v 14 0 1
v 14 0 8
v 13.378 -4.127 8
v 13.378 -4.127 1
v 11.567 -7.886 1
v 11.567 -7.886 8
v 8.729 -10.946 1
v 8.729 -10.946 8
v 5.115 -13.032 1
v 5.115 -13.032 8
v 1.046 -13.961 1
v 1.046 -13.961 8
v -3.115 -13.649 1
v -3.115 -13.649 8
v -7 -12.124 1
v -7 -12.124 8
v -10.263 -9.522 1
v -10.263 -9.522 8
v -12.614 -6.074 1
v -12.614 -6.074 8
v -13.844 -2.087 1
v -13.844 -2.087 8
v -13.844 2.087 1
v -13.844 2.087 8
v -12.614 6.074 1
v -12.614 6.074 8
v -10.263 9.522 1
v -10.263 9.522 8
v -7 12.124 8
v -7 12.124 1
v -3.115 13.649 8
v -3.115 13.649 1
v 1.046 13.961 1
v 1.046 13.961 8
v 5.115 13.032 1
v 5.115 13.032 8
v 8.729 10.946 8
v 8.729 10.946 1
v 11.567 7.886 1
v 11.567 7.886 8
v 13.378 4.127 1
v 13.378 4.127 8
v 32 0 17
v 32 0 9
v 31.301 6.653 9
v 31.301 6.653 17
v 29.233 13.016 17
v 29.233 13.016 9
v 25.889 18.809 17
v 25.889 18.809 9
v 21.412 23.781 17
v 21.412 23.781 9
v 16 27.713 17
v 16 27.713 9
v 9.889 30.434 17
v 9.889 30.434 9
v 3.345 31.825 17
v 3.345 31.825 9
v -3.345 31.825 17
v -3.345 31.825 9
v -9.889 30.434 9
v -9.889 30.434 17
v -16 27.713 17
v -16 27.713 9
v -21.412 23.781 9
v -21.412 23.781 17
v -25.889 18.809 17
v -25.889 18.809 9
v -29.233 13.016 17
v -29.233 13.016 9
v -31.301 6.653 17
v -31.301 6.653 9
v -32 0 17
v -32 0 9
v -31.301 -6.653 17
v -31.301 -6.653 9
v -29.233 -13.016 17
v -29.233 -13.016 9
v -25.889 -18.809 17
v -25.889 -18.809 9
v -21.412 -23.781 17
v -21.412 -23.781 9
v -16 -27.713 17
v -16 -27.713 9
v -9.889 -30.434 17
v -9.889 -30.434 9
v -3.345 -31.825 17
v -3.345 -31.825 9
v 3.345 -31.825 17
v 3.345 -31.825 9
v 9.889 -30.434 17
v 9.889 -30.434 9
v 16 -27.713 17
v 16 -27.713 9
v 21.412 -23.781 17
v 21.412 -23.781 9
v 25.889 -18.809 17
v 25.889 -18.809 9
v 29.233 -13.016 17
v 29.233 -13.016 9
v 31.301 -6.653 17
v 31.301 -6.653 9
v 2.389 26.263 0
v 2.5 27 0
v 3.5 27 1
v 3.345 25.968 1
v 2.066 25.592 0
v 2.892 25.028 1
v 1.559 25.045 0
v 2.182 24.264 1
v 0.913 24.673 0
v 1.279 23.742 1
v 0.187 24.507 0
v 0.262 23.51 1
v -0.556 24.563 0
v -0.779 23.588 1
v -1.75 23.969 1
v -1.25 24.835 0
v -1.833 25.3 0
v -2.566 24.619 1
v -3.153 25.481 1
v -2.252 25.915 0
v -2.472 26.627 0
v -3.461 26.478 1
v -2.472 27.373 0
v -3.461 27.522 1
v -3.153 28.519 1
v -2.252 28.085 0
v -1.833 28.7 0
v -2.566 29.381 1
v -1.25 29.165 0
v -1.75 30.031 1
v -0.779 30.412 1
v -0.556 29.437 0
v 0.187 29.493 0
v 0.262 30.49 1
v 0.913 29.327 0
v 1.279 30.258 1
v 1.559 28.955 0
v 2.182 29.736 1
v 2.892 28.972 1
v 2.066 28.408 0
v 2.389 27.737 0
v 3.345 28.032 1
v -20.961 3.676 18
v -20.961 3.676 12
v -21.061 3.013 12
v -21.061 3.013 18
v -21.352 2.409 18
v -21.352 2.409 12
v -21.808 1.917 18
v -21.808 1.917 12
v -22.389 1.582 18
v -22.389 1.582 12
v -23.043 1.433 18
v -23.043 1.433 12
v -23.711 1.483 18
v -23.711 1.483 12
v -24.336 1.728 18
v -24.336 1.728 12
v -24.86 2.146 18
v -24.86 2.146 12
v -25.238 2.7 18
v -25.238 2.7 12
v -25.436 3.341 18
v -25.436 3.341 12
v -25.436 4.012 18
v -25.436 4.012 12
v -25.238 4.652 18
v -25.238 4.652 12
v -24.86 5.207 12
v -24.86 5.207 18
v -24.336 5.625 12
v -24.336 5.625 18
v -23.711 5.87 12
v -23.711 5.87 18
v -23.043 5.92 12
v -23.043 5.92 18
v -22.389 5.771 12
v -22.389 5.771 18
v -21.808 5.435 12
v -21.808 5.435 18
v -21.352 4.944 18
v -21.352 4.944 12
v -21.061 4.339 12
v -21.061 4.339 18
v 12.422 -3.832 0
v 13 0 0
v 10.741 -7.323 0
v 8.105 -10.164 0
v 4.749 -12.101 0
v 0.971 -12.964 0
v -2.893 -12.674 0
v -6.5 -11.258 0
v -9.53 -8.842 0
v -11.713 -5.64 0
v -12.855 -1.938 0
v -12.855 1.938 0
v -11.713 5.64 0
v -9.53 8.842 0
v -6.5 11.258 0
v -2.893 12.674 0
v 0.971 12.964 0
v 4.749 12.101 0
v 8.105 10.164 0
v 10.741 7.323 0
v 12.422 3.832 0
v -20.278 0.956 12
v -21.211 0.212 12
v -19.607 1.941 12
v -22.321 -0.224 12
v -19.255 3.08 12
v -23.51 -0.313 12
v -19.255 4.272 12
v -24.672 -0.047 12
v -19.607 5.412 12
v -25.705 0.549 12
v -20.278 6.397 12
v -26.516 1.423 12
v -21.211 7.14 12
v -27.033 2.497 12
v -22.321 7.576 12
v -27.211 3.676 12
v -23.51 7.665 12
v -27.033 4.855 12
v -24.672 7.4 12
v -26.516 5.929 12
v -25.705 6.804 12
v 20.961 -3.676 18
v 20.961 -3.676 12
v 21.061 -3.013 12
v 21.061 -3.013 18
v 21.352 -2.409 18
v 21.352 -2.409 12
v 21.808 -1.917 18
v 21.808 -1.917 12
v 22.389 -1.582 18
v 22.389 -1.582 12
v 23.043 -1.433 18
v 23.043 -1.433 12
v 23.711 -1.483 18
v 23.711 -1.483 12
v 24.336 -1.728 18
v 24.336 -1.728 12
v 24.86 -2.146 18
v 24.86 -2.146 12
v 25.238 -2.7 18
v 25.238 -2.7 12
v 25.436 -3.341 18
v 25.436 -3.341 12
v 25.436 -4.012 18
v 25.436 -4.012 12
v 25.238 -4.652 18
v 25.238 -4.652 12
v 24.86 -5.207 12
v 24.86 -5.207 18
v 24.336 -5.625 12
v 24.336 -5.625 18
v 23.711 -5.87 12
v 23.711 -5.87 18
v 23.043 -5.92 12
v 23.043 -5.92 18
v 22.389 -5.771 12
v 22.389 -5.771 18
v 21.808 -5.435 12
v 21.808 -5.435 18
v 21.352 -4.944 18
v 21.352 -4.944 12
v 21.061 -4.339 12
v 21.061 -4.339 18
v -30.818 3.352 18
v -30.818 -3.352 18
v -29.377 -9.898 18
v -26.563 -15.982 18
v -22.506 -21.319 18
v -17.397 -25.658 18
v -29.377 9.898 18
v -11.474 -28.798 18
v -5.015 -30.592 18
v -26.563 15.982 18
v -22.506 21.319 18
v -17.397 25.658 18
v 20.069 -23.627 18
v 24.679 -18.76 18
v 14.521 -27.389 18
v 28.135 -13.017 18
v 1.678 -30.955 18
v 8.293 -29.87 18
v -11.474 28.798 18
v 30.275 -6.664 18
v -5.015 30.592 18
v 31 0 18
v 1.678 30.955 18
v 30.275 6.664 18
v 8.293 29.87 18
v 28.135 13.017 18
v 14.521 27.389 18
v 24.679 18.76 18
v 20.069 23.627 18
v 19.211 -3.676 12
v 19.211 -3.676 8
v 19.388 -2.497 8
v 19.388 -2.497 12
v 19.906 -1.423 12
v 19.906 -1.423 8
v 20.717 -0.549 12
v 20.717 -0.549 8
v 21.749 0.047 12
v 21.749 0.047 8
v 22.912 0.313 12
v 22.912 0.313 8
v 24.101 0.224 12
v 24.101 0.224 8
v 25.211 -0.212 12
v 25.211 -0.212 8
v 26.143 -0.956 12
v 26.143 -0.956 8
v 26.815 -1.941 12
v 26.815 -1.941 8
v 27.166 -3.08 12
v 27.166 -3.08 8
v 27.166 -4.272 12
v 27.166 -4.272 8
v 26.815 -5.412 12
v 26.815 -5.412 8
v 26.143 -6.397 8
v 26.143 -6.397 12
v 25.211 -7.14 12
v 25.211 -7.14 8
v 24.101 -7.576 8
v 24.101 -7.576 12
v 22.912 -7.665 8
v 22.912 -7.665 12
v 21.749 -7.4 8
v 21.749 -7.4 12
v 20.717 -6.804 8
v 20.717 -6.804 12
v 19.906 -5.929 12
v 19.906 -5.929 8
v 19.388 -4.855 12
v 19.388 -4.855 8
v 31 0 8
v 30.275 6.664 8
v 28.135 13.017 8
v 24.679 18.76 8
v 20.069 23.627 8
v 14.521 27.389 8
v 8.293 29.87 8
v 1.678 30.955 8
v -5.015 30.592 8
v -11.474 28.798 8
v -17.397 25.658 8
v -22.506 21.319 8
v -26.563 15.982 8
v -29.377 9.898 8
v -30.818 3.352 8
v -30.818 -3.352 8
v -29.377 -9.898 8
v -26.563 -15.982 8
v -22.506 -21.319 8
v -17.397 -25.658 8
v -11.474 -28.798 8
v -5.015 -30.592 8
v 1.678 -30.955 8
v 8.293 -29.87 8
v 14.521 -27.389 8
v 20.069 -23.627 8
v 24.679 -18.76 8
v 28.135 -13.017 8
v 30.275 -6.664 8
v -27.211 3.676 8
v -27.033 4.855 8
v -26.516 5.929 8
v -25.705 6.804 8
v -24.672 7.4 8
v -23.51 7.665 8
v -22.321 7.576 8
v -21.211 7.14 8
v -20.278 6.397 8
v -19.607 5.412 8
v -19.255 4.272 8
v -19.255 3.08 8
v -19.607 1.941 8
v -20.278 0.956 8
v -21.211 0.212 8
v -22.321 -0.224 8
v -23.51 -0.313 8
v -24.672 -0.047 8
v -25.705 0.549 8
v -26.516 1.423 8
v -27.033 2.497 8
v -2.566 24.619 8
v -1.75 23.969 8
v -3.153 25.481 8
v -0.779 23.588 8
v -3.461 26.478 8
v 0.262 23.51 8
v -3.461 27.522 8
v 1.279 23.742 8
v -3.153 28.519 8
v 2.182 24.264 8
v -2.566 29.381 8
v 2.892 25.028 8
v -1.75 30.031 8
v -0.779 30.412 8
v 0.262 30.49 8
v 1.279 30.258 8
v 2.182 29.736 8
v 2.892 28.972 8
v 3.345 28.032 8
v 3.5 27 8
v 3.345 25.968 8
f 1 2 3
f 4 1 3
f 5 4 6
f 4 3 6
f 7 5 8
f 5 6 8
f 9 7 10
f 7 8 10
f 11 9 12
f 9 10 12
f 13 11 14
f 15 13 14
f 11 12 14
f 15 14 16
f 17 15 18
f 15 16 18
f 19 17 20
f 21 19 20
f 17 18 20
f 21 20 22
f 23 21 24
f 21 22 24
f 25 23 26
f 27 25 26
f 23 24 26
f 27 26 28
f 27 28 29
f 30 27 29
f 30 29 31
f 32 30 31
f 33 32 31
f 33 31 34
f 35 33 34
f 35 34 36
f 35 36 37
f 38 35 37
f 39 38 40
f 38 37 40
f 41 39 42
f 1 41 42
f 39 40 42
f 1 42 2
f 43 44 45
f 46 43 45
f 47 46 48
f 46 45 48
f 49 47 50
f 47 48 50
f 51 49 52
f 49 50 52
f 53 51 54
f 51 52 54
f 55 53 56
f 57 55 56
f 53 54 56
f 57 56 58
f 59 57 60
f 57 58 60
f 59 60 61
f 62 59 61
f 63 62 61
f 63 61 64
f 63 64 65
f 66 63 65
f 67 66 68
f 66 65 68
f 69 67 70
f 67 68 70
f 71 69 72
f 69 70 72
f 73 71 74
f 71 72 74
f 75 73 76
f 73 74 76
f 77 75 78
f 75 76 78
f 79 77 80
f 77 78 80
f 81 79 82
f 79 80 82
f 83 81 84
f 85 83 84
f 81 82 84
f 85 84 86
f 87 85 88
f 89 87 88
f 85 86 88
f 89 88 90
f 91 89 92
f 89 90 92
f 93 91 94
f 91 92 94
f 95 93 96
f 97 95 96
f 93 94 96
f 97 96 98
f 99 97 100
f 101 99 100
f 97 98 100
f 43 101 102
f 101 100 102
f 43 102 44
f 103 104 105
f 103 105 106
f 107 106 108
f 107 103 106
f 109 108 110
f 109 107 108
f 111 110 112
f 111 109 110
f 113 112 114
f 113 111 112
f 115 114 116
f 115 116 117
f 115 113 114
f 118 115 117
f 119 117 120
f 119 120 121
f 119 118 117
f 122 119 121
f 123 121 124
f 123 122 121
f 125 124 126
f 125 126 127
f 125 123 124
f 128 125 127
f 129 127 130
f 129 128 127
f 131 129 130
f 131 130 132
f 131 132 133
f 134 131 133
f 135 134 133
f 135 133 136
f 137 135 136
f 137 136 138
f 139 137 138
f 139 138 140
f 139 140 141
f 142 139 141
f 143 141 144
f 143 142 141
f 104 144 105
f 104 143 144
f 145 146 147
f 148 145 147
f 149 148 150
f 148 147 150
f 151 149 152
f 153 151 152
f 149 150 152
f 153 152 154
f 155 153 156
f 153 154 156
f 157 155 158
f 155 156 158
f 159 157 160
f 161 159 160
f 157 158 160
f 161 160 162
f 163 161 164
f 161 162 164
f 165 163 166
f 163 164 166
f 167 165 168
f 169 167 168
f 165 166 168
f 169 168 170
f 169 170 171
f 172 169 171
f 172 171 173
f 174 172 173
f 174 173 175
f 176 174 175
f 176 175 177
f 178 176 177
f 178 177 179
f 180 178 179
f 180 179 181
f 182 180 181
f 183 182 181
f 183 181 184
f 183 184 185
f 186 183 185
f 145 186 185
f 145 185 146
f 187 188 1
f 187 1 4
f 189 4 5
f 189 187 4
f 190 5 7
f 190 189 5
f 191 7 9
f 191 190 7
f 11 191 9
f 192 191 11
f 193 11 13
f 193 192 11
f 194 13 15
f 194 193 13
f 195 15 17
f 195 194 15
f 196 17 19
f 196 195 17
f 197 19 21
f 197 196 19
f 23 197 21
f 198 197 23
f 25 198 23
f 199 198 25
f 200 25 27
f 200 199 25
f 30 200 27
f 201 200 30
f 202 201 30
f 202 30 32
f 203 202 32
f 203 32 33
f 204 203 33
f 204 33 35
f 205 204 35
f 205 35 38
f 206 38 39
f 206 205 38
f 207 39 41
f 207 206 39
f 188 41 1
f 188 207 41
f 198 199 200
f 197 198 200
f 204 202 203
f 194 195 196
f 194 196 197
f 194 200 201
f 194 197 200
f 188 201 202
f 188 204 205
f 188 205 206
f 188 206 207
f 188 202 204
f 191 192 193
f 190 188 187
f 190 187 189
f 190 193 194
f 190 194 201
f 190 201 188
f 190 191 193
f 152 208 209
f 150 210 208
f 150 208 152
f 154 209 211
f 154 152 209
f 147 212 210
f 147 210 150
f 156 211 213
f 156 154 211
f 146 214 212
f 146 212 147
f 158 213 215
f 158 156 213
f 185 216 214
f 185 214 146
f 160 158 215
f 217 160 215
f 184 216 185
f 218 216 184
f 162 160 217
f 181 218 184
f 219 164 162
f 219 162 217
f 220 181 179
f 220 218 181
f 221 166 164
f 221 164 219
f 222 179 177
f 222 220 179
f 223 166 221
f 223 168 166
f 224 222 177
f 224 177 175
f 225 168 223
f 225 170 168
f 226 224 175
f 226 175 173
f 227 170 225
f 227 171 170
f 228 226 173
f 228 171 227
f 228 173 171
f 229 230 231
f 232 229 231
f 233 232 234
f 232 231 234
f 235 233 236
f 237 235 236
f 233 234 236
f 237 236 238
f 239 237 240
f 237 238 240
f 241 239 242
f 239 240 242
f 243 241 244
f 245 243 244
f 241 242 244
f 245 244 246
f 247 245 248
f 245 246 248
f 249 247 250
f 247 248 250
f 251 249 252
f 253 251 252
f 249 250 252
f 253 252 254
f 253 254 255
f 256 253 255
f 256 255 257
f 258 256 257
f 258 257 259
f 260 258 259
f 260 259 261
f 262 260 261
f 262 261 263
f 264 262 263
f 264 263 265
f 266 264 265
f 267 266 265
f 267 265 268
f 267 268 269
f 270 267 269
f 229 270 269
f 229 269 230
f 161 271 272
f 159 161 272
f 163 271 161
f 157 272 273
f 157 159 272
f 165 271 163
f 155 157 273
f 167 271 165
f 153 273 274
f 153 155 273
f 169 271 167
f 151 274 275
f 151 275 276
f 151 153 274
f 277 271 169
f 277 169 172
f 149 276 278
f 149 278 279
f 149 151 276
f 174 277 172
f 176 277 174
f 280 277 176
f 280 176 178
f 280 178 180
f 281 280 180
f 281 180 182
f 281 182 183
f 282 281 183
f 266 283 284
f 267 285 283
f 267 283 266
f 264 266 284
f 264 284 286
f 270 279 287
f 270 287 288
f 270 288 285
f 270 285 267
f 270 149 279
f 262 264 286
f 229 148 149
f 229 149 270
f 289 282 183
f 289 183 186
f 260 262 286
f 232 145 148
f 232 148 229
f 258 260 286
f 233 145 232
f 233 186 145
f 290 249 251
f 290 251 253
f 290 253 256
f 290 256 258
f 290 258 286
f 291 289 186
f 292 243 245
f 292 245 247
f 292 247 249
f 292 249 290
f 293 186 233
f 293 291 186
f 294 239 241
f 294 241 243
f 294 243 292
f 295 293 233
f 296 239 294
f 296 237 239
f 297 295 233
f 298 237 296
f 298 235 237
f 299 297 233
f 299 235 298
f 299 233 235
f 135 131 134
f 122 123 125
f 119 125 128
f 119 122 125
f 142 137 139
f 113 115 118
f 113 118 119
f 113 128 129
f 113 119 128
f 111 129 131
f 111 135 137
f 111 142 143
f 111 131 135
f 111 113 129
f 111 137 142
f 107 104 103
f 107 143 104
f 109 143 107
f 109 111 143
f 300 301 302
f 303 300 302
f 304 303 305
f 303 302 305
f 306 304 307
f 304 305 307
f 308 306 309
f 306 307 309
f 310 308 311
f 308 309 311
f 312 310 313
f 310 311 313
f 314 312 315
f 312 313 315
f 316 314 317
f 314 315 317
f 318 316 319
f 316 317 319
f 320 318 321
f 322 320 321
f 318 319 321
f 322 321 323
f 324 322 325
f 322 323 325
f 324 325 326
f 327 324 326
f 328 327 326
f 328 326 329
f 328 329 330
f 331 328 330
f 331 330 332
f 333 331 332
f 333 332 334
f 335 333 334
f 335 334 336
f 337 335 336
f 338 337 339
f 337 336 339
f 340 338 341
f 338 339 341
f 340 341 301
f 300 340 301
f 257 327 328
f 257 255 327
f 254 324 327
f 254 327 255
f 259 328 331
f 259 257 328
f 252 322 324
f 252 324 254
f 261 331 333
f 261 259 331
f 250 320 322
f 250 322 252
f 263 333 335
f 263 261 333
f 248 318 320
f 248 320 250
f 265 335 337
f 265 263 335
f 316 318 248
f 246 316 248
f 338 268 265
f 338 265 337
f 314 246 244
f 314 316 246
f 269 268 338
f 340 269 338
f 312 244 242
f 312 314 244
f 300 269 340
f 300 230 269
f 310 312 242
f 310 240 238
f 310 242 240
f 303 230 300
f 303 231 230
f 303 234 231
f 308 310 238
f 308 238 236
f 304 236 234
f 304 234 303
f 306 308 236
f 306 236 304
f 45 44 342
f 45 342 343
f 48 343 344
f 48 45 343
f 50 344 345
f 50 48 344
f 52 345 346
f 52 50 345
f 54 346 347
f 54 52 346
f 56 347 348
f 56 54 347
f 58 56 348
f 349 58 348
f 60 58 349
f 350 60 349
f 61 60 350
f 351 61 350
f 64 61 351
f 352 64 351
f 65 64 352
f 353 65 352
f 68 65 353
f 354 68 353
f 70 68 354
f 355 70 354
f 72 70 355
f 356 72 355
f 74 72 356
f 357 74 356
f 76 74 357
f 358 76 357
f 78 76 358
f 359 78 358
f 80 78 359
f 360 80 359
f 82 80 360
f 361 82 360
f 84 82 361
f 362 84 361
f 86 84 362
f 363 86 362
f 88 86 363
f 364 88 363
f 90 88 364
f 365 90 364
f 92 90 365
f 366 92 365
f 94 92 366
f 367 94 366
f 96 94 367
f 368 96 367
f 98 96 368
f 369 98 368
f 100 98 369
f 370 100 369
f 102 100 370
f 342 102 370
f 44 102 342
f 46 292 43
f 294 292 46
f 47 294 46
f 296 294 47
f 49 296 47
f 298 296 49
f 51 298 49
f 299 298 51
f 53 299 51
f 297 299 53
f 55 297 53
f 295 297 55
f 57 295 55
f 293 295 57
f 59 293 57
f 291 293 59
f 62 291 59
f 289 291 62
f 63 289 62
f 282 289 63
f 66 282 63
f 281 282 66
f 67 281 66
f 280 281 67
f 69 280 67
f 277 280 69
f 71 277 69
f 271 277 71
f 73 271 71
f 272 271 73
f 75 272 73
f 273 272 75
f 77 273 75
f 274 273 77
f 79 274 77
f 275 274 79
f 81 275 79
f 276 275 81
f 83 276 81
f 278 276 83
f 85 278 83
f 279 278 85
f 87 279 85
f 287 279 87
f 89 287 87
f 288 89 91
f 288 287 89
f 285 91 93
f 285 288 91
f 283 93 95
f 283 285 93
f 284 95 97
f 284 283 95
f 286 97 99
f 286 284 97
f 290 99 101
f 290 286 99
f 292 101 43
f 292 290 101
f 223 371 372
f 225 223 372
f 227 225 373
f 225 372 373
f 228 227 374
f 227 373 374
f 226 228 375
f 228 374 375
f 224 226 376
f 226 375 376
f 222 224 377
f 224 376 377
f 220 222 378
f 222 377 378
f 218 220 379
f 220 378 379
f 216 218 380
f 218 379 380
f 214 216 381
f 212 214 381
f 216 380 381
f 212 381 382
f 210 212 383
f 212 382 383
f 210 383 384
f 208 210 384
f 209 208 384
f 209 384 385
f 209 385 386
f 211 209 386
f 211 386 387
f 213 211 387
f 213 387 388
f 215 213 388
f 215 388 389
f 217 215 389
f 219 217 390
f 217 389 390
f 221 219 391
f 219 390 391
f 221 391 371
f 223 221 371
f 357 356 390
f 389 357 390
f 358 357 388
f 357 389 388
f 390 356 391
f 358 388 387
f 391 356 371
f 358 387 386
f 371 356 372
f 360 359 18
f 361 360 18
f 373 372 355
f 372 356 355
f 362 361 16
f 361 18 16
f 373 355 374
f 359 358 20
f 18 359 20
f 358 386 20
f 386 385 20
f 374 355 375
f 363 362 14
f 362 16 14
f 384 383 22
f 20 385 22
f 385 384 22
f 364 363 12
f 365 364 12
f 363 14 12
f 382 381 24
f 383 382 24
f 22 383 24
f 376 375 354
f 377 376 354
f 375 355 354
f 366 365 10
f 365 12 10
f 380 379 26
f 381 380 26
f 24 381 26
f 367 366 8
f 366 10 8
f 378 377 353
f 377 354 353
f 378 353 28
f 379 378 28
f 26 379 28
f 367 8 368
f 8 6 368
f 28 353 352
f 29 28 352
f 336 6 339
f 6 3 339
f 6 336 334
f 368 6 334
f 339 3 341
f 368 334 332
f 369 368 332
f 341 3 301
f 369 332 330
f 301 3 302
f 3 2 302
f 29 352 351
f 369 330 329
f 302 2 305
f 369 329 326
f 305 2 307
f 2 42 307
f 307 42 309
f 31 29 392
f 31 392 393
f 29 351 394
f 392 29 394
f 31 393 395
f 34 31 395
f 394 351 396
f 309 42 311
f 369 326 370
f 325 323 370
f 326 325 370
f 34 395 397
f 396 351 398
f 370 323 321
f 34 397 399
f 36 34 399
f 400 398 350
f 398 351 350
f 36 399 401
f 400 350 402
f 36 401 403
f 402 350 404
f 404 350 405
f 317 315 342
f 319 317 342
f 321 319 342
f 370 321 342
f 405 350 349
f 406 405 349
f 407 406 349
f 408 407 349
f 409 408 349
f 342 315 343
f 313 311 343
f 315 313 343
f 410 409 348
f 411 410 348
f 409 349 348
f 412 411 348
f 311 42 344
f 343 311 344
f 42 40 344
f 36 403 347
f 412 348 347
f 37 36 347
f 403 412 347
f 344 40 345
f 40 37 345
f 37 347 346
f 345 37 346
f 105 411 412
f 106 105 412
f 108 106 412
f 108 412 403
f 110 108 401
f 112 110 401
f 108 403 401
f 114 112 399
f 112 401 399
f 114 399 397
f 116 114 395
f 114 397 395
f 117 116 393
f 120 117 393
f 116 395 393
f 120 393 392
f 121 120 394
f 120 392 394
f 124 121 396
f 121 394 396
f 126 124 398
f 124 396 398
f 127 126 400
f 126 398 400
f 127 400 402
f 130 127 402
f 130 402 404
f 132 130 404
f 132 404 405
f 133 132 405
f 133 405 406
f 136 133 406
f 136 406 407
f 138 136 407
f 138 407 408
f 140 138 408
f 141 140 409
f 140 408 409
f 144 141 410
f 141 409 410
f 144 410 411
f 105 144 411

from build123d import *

# Parameters (mm, degrees)
SKETCH_1_R          = 3.5
EXTRUDE_1_DEPTH     = 5
FILLET_1_R          = 10
SKETCH_2_R          = 18
EXTRUDE_2_DEPTH     = 3
SKETCH_3_R          = 14
CUT_EXTRUDE_1_DEPTH = 32
SKETCH_4_R          = 16.75
CUT_EXTRUDE_2_DEPTH = 3
CHAMFER_1_SIZE      = 0.5
SKETCH_5_R          = 32
EXTRUDE_3_DEPTH     = 10
SKETCH_6_R          = 3.5
SKETCH_6_R_2        = 14
EXTRUDE_4_DEPTH     = 8
SKETCH_7_W          = 21.874500366
SKETCH_7_H          = 73.978344987
CUT_EXTRUDE_3_DEPTH = 62.5
CHAMFER_2_SIZE      = 1
CHAMFER_3_SIZE      = 1
SKETCH_8_R          = 2.25
CUT_EXTRUDE_4_DEPTH = 125
SKETCH_9_R          = 4
CUT_EXTRUDE_5_DEPTH = 4


with BuildPart() as part:
    # 草图1 → 凸台-拉伸1 (new body)
    with BuildSketch(Plane.XY):
        with BuildLine():
            Line((-11.5, 18.165902125), (-7.564716302, 29.602895938))
            ThreePointArc((-7.564716302, 29.602895938), (0, 35), (7.564716302, 29.602895938))
            Line((7.564716302, 29.602895938), (11.5, 18.165902125))
            ThreePointArc((11.5, 18.165902125), (18.619546181, 10.75), (21.482132723, 0.876341081))
            Line((21.482132723, 0.876341081), (29.419218059, -8.250211479))
            ThreePointArc((29.419218059, -8.250211479), (30.310889132, -17.5), (21.854501757, -21.352684459))
            Line((21.854501757, -21.352684459), (9.982132723, -19.042243206))
            ThreePointArc((9.982132723, -19.042243206), (0, -21.5), (-9.982132723, -19.042243206))
            Line((-9.982132723, -19.042243206), (-21.854501757, -21.352684459))
            ThreePointArc((-21.854501757, -21.352684459), (-30.310889132, -17.5), (-29.419218059, -8.250211479))
            Line((-29.419218059, -8.250211479), (-21.482132723, 0.876341081))
            ThreePointArc((-21.482132723, 0.876341081), (-18.619546181, 10.75), (-11.5, 18.165902125))
        make_face()
        with Locations((0, 27)):
            Circle(SKETCH_1_R, mode=Mode.SUBTRACT)
        with Locations((23.382685902, -13.5)):
            Circle(SKETCH_1_R, mode=Mode.SUBTRACT)
        with Locations((-23.382685902, -13.5)):
            Circle(SKETCH_1_R, mode=Mode.SUBTRACT)
    extrude(amount=EXTRUDE_1_DEPTH)

    # 圆角1
    fillet_1_edges = [part.edges().sort_by_distance(p)[0] for p in [
        (21.482132723, 0.876341081, 2.5),
        (9.982132723, -19.042243206, 2.5),
        (-9.982132723, -19.042243206, 2.5),
        (-21.482132723, 0.876341081, 2.5),
        (-11.5, 18.165902125, 2.5),
        (11.5, 18.165902125, 2.5),
    ]]
    fillet(fillet_1_edges, radius=FILLET_1_R)

    # 草图2 → 凸台-拉伸2 (add)
    with BuildSketch(Plane.XY.offset(5)):
        Circle(SKETCH_2_R)
    extrude(amount=EXTRUDE_2_DEPTH)

    # 草图3 → 切除-拉伸1 (cut)
    with BuildSketch(Plane.XY.offset(8)):
        Circle(SKETCH_3_R)
    extrude(amount=-CUT_EXTRUDE_1_DEPTH, mode=Mode.SUBTRACT)

    # 草图4 → 切除-拉伸2 (cut)
    with BuildSketch(Plane(origin=(0, 0, 0), x_dir=(-1, 0, 0), z_dir=(0, 0, -1))):
        Circle(SKETCH_4_R)
    extrude(amount=-CUT_EXTRUDE_2_DEPTH, mode=Mode.SUBTRACT)

    # 倒角1
    chamfer_1_edges = [part.edges().sort_by_distance(p)[0] for p in [
        (-18, 0, 8),
    ]]
    chamfer(chamfer_1_edges, length=CHAMFER_1_SIZE)

    # 草图7 → 切除-拉伸3 (cut, symmetric)
    with BuildSketch(Plane(origin=(0, 0, 0), x_dir=(0, 0, -1), z_dir=(1, 0, 0))):
        with Locations((-1.024921742, 9.171265754)):
            Rectangle(SKETCH_7_W, SKETCH_7_H)
    extrude(amount=CUT_EXTRUDE_3_DEPTH, both=True, mode=Mode.SUBTRACT)


with BuildPart() as body_2:
    # 草图5 → 凸台-拉伸3 (new body)
    with BuildSketch(Plane.XY.offset(8)):
        Circle(SKETCH_5_R)
    extrude(amount=EXTRUDE_3_DEPTH)

    # 草图6 → 凸台-拉伸4 (add)
    with BuildSketch(Plane(origin=(0, 0, 8), x_dir=(-1, 0, 0), z_dir=(0, 0, -1))):
        with Locations(Location((0, 27, 0), (0, 0, 180))):
            Circle(SKETCH_6_R)
        with Locations(Location((0, 0, 0), (0, 0, 180))):
            Circle(SKETCH_6_R_2)
    extrude(amount=EXTRUDE_4_DEPTH)

    # 倒角2
    chamfer_2_edges = [body_2.edges().sort_by_distance(p)[0] for p in [
        (-3.5, 27, 0),
        (-14, 0, 0),
    ]]
    chamfer(chamfer_2_edges, length=CHAMFER_2_SIZE)

    # 倒角3
    chamfer_3_edges = [body_2.edges().sort_by_distance(p)[0] for p in [
        (-32, 0, 8),
        (-32, 0, 18),
    ]]
    chamfer(chamfer_3_edges, length=CHAMFER_3_SIZE)

    # 草图8 → 切除-拉伸4 (cut)
    with BuildSketch(Plane(origin=(0, 0, 8), x_dir=(-1, 0, 0), z_dir=(0, 0, -1))):
        with Locations((-23.210676004, -3.676209928)):
            Circle(SKETCH_8_R)
        with Locations(Location((23.210676004, 3.676209928, 0), (0, 0, 180))):
            Circle(SKETCH_8_R)
    extrude(amount=-CUT_EXTRUDE_4_DEPTH, mode=Mode.SUBTRACT)

    # 草图9 → 切除-拉伸5 (cut)
    with BuildSketch(Plane(origin=(0, 0, 8), x_dir=(-1, 0, 0), z_dir=(0, 0, -1))):
        with Locations((-23.210676004, -3.676209928)):
            Circle(SKETCH_9_R)
        with Locations((23.210676004, 3.676209928)):
            Circle(SKETCH_9_R)
    extrude(amount=-CUT_EXTRUDE_5_DEPTH, mode=Mode.SUBTRACT)


solid = body_2.part
